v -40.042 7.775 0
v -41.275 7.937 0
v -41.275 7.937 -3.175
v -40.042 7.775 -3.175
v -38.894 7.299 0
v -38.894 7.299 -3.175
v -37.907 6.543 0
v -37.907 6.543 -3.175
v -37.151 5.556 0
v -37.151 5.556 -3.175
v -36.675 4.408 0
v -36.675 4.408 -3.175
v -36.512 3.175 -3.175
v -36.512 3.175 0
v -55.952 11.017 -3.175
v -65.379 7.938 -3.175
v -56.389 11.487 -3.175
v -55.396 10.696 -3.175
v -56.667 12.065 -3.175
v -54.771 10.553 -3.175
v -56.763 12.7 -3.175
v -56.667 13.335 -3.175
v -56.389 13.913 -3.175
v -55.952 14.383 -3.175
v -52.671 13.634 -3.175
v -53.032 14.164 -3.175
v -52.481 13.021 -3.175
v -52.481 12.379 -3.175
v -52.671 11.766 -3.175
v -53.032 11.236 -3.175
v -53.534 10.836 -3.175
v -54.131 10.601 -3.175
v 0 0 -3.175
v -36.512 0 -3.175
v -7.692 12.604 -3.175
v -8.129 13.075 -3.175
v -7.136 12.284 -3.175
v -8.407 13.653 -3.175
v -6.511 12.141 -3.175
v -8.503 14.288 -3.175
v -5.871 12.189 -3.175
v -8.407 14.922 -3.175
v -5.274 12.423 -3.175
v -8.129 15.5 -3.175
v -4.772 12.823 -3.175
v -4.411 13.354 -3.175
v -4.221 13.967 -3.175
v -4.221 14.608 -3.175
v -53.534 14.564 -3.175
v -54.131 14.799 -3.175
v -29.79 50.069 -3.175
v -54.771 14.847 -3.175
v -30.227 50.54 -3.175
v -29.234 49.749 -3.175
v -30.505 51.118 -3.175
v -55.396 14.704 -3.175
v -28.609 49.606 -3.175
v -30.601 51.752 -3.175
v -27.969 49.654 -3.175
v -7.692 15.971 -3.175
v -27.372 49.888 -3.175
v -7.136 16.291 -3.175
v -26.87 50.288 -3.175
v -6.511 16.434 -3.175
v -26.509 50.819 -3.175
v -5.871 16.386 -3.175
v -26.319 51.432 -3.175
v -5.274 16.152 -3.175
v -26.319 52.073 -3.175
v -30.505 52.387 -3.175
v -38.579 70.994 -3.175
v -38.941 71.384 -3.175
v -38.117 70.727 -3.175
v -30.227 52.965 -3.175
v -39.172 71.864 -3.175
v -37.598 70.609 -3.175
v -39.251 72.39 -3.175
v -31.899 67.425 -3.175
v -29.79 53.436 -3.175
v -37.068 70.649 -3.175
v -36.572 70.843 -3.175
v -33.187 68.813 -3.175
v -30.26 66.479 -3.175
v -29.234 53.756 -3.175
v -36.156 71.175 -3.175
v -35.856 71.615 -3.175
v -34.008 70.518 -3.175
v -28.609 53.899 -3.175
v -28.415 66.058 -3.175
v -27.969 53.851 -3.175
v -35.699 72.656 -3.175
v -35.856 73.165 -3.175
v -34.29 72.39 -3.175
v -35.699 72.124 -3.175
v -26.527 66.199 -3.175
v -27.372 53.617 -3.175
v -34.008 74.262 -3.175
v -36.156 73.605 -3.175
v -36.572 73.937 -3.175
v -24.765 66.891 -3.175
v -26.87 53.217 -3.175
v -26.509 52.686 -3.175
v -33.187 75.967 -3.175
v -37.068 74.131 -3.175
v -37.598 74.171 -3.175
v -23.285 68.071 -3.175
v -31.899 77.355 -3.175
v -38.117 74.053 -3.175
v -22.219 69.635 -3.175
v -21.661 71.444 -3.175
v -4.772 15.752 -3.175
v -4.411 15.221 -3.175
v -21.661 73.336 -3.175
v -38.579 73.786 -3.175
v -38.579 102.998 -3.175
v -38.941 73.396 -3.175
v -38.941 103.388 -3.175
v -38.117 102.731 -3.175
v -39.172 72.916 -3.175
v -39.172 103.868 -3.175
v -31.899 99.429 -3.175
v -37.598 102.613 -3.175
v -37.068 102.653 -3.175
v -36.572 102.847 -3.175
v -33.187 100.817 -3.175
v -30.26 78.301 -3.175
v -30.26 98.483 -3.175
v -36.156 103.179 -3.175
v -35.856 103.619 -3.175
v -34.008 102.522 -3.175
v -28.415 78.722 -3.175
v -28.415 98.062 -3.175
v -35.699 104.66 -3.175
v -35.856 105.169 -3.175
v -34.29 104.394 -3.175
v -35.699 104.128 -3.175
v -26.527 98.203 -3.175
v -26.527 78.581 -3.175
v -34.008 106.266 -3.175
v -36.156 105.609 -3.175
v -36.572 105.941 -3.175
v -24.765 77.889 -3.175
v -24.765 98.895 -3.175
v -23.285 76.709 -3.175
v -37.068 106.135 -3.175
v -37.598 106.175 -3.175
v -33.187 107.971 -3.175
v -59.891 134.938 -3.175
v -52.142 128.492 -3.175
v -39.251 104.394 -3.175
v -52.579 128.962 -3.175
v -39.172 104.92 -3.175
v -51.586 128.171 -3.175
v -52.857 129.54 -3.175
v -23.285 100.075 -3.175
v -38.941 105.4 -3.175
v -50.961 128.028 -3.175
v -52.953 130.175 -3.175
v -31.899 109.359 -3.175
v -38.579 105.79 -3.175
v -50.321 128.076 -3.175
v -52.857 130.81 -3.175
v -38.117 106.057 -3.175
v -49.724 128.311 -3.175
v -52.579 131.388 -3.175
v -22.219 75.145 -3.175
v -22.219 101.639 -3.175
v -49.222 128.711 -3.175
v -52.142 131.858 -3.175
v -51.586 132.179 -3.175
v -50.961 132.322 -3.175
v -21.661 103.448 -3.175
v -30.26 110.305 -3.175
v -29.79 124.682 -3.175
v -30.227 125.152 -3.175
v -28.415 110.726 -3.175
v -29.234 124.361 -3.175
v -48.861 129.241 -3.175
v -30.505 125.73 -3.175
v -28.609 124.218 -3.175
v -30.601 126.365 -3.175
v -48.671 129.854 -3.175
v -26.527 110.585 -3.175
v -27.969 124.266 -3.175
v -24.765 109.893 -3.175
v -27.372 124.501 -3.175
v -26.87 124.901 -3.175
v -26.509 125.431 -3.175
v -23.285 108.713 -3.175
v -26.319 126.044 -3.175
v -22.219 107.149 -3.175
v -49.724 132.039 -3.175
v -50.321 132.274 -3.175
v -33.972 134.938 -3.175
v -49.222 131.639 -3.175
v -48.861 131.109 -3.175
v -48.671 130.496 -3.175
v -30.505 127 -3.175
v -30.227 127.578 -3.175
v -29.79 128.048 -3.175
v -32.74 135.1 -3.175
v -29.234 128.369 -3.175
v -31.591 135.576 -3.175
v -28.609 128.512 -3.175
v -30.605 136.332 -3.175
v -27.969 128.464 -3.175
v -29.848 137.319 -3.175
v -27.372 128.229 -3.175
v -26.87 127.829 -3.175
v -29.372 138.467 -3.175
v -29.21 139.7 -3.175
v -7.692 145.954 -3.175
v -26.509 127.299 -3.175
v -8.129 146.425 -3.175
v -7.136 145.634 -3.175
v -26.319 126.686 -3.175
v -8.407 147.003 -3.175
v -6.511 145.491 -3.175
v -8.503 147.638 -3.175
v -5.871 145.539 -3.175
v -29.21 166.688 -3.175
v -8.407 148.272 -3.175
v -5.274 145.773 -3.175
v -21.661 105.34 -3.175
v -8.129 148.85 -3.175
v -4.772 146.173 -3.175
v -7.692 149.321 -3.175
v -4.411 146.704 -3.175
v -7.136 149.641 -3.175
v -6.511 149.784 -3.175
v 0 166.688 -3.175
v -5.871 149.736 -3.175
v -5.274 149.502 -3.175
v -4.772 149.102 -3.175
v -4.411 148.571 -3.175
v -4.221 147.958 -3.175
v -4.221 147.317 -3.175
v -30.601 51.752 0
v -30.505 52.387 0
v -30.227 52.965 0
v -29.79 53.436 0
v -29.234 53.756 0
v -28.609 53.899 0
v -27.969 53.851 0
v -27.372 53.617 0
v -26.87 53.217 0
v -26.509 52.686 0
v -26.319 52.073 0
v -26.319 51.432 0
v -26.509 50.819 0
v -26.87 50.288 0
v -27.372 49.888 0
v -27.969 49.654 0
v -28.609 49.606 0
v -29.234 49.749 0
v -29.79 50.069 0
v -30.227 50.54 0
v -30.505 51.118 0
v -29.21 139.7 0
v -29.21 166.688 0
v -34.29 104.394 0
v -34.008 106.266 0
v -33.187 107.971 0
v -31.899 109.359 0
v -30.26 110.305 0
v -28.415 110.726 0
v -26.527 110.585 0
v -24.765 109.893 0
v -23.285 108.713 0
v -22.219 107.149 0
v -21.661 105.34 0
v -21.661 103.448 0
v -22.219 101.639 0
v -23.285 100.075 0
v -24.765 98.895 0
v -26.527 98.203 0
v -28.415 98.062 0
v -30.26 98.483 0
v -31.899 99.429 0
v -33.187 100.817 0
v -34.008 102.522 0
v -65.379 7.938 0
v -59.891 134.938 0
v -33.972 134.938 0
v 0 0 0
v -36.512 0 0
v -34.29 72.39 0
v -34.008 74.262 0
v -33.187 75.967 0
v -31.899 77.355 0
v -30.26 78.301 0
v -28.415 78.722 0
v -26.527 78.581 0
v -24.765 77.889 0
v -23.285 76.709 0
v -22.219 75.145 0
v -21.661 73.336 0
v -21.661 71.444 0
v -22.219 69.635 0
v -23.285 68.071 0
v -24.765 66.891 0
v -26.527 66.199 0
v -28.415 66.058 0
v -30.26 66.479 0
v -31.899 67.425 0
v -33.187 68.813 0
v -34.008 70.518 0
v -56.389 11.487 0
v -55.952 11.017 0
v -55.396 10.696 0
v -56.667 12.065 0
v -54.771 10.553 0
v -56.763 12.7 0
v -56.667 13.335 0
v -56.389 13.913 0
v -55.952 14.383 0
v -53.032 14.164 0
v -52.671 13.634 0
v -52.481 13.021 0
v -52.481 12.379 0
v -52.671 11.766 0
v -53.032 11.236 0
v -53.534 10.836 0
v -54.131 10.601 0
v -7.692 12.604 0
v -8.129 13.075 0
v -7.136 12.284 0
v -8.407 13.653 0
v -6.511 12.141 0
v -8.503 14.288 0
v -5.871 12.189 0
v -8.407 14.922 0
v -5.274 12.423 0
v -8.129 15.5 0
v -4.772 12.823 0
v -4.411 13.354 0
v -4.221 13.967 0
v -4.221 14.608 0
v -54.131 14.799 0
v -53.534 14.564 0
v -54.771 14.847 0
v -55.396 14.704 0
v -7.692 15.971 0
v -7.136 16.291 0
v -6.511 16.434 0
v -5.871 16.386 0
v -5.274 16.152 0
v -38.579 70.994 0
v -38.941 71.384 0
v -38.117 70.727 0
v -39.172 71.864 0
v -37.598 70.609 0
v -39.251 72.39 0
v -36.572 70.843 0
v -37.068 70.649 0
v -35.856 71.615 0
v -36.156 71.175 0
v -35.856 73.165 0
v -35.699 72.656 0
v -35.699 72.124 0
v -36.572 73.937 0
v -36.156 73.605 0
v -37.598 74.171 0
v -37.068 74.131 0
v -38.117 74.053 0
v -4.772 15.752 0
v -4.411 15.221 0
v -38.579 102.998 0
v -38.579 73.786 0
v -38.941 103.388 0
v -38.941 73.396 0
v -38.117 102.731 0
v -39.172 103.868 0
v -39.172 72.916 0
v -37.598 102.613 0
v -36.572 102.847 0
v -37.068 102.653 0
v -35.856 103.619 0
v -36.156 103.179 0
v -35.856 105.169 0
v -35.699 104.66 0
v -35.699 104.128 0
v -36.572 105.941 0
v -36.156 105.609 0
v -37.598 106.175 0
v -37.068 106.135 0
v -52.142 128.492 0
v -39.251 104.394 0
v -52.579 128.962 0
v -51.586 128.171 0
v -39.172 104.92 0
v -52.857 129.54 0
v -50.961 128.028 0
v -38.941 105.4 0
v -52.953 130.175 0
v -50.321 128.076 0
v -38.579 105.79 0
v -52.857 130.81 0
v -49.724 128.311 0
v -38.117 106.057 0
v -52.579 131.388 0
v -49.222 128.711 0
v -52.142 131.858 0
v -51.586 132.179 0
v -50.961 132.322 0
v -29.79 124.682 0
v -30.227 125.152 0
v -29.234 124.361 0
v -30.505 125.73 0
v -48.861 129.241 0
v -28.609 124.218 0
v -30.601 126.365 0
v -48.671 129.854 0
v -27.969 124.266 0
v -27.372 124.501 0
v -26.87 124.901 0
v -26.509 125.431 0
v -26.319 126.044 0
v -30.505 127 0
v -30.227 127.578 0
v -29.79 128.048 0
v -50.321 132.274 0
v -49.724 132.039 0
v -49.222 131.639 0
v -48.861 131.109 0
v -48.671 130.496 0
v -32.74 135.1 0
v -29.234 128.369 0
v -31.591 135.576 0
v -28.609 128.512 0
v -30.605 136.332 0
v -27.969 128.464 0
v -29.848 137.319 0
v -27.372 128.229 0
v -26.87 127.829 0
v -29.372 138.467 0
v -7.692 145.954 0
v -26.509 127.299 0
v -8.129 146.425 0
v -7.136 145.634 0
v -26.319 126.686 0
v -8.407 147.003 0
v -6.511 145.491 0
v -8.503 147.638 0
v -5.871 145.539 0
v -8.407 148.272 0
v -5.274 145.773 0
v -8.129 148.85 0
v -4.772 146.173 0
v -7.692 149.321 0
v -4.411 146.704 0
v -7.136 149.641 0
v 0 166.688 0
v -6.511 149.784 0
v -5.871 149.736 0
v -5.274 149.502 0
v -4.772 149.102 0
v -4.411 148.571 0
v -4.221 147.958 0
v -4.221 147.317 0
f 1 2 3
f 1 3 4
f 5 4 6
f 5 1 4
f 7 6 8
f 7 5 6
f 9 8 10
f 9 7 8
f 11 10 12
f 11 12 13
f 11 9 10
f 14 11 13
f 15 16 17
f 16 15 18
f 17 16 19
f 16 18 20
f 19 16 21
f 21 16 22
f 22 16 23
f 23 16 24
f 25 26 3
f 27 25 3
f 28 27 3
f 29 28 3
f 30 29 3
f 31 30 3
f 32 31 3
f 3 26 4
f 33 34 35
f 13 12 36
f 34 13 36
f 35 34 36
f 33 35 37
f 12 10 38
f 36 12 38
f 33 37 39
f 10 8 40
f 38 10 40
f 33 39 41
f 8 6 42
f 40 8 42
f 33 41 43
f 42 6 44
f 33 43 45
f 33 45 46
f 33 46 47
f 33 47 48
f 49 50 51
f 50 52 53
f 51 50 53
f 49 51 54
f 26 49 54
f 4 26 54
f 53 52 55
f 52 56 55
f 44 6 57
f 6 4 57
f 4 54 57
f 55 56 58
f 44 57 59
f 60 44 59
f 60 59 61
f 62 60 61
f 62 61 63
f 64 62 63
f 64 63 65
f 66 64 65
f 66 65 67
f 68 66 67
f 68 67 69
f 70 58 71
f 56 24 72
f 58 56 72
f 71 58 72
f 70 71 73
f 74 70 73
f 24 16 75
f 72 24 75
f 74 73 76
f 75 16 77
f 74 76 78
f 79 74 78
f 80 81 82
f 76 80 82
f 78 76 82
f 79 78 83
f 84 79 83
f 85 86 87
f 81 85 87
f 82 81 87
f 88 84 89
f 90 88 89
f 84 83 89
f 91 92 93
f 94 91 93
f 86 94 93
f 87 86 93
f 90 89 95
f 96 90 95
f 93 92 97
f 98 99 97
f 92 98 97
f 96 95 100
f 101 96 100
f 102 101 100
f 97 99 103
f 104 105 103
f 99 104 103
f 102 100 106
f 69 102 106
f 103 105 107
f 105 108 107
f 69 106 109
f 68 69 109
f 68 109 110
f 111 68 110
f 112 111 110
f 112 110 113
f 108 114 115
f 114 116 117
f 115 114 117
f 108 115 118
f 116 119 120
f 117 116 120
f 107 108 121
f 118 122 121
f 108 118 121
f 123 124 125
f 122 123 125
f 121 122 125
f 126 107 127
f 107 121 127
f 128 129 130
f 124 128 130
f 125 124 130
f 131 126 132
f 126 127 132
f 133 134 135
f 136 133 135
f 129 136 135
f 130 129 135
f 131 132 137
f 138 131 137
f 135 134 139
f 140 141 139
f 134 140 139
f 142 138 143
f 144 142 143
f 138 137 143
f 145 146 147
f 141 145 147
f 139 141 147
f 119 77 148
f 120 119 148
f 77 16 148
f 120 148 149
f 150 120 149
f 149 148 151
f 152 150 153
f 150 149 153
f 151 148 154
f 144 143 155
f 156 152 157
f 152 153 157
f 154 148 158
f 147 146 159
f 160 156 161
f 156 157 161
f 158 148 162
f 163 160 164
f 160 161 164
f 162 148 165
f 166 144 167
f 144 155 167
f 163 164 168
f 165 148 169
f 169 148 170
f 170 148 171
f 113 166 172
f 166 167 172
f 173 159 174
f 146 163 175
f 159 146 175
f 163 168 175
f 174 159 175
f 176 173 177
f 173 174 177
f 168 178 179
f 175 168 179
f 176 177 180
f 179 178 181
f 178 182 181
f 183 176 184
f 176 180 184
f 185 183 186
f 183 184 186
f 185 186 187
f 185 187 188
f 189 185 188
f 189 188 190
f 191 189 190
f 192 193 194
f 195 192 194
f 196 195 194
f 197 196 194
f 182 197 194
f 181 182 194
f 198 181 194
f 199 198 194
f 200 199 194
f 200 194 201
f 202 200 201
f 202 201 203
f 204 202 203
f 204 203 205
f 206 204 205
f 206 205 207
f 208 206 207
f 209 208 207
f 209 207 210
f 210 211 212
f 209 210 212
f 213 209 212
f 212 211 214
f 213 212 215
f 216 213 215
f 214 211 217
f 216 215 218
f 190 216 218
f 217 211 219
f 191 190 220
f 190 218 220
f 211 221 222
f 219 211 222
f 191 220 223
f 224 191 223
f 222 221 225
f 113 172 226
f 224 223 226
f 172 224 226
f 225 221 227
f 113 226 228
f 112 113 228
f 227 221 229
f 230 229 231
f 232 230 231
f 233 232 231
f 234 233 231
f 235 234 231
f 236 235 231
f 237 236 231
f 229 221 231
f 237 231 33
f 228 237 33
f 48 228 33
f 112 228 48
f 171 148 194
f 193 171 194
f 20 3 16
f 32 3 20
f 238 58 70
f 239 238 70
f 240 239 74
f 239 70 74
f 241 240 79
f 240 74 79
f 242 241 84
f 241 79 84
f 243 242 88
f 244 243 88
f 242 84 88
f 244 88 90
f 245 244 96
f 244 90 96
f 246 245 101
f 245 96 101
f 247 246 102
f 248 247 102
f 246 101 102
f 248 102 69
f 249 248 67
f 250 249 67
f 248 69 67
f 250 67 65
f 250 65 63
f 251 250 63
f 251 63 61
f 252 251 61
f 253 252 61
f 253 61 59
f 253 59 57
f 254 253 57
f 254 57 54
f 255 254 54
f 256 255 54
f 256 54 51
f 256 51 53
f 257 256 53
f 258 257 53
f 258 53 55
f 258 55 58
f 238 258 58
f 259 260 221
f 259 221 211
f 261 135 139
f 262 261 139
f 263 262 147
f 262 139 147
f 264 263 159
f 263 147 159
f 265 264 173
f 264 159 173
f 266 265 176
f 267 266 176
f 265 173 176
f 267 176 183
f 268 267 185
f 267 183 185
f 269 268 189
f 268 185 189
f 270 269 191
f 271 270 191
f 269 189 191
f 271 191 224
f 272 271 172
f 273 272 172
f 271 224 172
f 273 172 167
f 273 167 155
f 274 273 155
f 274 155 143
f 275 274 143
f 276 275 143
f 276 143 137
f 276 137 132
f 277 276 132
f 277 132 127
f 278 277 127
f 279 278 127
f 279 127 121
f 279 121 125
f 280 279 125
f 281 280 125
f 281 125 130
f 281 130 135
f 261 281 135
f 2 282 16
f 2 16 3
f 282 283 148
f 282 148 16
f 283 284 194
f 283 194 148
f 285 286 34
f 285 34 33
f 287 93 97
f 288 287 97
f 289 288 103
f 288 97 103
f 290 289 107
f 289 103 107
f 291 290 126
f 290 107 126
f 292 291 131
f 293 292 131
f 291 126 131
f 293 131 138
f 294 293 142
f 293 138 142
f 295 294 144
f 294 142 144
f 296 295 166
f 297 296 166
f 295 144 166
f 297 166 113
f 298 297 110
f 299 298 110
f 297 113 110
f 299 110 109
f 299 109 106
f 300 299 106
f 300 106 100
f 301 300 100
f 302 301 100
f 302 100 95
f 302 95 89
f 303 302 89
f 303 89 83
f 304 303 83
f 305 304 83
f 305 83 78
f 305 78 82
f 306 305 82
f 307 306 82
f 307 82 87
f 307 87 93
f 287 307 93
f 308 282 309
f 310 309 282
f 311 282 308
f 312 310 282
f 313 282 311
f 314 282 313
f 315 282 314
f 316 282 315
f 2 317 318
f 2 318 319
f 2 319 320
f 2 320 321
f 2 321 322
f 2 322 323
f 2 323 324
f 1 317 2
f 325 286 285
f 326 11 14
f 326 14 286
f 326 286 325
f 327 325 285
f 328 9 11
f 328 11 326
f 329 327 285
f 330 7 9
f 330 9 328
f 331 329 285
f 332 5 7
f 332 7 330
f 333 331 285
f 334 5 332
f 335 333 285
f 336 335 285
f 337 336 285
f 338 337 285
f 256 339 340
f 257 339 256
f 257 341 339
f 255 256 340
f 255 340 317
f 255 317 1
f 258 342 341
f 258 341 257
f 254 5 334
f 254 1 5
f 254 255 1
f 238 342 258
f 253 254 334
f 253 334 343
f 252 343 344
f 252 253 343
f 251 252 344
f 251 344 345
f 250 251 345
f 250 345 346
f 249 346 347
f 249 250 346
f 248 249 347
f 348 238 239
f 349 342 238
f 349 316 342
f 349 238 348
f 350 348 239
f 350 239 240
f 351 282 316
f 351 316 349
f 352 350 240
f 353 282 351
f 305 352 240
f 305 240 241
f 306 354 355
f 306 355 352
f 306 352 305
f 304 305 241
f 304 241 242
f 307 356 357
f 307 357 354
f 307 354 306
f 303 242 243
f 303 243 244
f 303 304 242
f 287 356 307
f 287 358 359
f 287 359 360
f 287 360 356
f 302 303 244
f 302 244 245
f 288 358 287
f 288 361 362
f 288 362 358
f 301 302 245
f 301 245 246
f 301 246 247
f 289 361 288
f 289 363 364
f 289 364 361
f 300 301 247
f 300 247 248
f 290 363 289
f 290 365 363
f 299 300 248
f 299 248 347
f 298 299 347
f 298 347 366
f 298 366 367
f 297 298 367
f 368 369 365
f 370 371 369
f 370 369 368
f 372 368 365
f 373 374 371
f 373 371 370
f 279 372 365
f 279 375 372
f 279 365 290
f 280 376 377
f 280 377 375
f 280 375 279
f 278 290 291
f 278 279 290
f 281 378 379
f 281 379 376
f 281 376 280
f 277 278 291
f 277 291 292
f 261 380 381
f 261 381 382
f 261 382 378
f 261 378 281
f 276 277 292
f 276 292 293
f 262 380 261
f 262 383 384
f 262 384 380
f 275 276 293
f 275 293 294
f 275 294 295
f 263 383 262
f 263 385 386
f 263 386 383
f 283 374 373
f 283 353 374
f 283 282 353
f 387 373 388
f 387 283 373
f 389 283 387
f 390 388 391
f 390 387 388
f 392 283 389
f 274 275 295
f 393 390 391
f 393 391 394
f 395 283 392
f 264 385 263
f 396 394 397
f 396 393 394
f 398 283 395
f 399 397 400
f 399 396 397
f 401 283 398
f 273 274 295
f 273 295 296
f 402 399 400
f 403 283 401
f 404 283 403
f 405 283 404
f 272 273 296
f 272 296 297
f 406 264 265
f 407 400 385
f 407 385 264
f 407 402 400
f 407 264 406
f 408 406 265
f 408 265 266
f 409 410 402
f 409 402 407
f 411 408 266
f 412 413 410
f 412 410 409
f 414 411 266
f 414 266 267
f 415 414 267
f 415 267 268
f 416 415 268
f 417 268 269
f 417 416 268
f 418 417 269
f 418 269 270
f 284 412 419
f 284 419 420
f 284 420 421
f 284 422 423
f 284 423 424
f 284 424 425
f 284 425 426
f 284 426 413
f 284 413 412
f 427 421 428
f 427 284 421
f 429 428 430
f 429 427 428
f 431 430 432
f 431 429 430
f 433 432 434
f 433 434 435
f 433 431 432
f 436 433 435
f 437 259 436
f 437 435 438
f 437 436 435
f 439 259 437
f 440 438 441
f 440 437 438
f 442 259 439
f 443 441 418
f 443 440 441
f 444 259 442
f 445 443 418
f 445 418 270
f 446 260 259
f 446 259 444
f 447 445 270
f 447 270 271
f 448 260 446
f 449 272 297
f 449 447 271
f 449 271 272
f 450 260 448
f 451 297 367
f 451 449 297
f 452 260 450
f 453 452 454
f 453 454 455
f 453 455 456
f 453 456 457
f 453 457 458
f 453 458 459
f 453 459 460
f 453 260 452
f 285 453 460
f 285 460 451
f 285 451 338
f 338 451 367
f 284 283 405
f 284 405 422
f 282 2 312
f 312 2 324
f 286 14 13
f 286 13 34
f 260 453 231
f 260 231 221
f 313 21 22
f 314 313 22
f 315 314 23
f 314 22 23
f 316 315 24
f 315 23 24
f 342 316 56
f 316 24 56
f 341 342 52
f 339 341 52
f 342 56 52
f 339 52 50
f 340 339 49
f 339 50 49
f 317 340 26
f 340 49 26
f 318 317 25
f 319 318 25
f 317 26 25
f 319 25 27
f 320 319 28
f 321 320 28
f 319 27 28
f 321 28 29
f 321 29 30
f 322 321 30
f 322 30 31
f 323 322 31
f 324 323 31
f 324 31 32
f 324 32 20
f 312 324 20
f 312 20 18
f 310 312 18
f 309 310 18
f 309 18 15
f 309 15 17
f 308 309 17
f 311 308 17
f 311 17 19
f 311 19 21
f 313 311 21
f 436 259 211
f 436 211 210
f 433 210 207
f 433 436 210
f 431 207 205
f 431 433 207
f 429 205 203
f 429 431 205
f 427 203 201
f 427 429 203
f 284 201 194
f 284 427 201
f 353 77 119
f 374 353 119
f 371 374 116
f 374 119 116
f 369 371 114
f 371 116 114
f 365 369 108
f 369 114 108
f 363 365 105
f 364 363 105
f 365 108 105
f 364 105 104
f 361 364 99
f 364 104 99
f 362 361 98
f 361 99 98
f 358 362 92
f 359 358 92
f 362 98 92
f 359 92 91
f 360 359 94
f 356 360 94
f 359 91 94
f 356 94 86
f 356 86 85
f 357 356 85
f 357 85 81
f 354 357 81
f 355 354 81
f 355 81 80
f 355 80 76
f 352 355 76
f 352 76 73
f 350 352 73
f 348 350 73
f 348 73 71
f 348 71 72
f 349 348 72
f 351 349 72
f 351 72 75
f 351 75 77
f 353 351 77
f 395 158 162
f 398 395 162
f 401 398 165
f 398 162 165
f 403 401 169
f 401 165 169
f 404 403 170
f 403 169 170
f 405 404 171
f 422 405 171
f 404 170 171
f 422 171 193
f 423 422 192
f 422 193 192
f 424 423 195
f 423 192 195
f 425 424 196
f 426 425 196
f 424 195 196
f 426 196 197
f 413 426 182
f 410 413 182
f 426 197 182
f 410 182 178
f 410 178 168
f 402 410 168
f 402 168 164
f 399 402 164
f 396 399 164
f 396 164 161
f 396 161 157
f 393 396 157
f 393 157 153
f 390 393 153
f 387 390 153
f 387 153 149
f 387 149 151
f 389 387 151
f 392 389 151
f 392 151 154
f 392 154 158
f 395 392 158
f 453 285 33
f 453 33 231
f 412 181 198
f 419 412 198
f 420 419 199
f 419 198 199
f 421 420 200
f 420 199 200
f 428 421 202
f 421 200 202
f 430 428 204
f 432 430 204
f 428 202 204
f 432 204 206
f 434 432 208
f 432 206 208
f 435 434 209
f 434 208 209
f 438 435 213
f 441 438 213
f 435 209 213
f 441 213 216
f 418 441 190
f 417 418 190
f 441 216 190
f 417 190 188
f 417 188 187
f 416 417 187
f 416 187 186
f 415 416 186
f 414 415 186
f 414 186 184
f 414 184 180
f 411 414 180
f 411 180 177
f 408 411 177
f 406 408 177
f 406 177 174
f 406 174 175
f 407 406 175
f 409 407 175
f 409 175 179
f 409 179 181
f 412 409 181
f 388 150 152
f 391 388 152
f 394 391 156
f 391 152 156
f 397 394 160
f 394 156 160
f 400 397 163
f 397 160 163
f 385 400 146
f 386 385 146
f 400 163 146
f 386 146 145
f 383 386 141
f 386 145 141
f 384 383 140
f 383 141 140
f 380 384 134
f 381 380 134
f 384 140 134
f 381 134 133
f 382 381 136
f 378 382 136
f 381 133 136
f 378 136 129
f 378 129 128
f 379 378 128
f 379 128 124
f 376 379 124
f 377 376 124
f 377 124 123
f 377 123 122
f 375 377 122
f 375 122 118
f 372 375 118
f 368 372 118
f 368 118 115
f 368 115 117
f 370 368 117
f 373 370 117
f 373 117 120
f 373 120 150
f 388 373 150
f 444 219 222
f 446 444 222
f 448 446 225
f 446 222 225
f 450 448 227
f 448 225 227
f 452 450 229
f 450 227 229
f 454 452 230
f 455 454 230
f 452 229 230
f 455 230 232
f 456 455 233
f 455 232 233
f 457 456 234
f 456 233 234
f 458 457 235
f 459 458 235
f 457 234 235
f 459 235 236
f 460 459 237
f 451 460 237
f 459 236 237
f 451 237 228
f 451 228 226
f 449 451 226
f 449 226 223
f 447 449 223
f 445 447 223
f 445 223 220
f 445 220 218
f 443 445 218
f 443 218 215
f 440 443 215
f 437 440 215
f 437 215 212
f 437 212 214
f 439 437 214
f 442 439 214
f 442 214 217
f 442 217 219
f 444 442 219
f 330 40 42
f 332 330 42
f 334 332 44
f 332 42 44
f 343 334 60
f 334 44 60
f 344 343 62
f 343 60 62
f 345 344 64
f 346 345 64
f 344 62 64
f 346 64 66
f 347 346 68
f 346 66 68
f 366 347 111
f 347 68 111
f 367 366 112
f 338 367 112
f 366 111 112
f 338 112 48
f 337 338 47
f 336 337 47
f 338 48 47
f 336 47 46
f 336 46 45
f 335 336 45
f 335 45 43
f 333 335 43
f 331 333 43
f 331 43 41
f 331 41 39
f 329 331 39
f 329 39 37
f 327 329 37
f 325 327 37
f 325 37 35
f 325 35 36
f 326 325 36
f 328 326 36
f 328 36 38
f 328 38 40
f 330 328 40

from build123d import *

# Parameters (mm, degrees)
BOSS_EXTRUDE1_DEPTH             = 3.175
F_9_64_0_14063_DIAMETER_HOLE1_D = 3.572002
F_1_2_0_5_DIAMETER_HOLE1_D      = 12.7
F_6_CLEARANCE_HOLE1_D           = 4.3053
F_6_CLEARANCE_HOLE2_D           = 4.3053
SKETCH13_W                      = 23.574867554
SKETCH13_H                      = 15.925568069
BOSS_EXTRUDE2_DEPTH             = 3.175


with BuildPart() as part:
    # Sketch1 → Boss-Extrude1 (new body)
    with BuildSketch(Plane.XY):
        with BuildLine():
            Line((-36.5125, 0), (0, 0))
            Line((0, 0), (0, 166.6875))
            Line((0, 166.6875), (-29.21, 166.6875))
            Line((-29.21, 166.6875), (-29.21, 139.7))
            ThreePointArc((-29.21, 139.7), (-30.604903955, 136.332403955), (-33.9725, 134.9375))
            Line((-33.9725, 134.9375), (-59.89066, 134.9375))
            Line((-59.89066, 134.9375), (-65.379450588, 7.9375))
            Line((-65.379450588, 7.9375), (-41.275, 7.9375))
            ThreePointArc((-41.275, 7.9375), (-37.907403955, 6.542596045), (-36.5125, 3.175))
            Line((-36.5125, 3.175), (-36.5125, 0))
        make_face()
    extrude(amount=-BOSS_EXTRUDE1_DEPTH)

    # 9/64 (0.14063) Diameter Hole1 (through all)
    with Locations(Plane.XY):
        with Locations((-18.415, 26.3525), (-37.465, 72.39), (-37.465, 104.394)):
            Hole(F_9_64_0_14063_DIAMETER_HOLE1_D / 2)

    # 1/2 (0.5) Diameter Hole1 (through all)
    with Locations(Plane.XY):
        with Locations((-27.94, 26.3525), (-27.94, 72.39), (-27.94, 104.394)):
            Hole(F_1_2_0_5_DIAMETER_HOLE1_D / 2)

    # #6 Clearance Hole1 (through all)
    with Locations(Plane.XY):
        with Locations((-28.448, 51.7525), (-28.448, 126.365)):
            Hole(F_6_CLEARANCE_HOLE1_D / 2)

    # #6 Clearance Hole2 (through all)
    with Locations(Plane.XY):
        with Locations((-50.8, 130.175), (-6.35, 147.6375), (-6.35, 14.2875), (-54.61, 12.7)):
            Hole(F_6_CLEARANCE_HOLE2_D / 2)

    # Sketch13 → Boss-Extrude2 (add, through all)
    with BuildSketch(Plane.XY):
        with Locations((-24.941412977, 26.424397309)):
            Rectangle(SKETCH13_W, SKETCH13_H)
    extrude(amount=-BOSS_EXTRUDE2_DEPTH)


solid = part.part
